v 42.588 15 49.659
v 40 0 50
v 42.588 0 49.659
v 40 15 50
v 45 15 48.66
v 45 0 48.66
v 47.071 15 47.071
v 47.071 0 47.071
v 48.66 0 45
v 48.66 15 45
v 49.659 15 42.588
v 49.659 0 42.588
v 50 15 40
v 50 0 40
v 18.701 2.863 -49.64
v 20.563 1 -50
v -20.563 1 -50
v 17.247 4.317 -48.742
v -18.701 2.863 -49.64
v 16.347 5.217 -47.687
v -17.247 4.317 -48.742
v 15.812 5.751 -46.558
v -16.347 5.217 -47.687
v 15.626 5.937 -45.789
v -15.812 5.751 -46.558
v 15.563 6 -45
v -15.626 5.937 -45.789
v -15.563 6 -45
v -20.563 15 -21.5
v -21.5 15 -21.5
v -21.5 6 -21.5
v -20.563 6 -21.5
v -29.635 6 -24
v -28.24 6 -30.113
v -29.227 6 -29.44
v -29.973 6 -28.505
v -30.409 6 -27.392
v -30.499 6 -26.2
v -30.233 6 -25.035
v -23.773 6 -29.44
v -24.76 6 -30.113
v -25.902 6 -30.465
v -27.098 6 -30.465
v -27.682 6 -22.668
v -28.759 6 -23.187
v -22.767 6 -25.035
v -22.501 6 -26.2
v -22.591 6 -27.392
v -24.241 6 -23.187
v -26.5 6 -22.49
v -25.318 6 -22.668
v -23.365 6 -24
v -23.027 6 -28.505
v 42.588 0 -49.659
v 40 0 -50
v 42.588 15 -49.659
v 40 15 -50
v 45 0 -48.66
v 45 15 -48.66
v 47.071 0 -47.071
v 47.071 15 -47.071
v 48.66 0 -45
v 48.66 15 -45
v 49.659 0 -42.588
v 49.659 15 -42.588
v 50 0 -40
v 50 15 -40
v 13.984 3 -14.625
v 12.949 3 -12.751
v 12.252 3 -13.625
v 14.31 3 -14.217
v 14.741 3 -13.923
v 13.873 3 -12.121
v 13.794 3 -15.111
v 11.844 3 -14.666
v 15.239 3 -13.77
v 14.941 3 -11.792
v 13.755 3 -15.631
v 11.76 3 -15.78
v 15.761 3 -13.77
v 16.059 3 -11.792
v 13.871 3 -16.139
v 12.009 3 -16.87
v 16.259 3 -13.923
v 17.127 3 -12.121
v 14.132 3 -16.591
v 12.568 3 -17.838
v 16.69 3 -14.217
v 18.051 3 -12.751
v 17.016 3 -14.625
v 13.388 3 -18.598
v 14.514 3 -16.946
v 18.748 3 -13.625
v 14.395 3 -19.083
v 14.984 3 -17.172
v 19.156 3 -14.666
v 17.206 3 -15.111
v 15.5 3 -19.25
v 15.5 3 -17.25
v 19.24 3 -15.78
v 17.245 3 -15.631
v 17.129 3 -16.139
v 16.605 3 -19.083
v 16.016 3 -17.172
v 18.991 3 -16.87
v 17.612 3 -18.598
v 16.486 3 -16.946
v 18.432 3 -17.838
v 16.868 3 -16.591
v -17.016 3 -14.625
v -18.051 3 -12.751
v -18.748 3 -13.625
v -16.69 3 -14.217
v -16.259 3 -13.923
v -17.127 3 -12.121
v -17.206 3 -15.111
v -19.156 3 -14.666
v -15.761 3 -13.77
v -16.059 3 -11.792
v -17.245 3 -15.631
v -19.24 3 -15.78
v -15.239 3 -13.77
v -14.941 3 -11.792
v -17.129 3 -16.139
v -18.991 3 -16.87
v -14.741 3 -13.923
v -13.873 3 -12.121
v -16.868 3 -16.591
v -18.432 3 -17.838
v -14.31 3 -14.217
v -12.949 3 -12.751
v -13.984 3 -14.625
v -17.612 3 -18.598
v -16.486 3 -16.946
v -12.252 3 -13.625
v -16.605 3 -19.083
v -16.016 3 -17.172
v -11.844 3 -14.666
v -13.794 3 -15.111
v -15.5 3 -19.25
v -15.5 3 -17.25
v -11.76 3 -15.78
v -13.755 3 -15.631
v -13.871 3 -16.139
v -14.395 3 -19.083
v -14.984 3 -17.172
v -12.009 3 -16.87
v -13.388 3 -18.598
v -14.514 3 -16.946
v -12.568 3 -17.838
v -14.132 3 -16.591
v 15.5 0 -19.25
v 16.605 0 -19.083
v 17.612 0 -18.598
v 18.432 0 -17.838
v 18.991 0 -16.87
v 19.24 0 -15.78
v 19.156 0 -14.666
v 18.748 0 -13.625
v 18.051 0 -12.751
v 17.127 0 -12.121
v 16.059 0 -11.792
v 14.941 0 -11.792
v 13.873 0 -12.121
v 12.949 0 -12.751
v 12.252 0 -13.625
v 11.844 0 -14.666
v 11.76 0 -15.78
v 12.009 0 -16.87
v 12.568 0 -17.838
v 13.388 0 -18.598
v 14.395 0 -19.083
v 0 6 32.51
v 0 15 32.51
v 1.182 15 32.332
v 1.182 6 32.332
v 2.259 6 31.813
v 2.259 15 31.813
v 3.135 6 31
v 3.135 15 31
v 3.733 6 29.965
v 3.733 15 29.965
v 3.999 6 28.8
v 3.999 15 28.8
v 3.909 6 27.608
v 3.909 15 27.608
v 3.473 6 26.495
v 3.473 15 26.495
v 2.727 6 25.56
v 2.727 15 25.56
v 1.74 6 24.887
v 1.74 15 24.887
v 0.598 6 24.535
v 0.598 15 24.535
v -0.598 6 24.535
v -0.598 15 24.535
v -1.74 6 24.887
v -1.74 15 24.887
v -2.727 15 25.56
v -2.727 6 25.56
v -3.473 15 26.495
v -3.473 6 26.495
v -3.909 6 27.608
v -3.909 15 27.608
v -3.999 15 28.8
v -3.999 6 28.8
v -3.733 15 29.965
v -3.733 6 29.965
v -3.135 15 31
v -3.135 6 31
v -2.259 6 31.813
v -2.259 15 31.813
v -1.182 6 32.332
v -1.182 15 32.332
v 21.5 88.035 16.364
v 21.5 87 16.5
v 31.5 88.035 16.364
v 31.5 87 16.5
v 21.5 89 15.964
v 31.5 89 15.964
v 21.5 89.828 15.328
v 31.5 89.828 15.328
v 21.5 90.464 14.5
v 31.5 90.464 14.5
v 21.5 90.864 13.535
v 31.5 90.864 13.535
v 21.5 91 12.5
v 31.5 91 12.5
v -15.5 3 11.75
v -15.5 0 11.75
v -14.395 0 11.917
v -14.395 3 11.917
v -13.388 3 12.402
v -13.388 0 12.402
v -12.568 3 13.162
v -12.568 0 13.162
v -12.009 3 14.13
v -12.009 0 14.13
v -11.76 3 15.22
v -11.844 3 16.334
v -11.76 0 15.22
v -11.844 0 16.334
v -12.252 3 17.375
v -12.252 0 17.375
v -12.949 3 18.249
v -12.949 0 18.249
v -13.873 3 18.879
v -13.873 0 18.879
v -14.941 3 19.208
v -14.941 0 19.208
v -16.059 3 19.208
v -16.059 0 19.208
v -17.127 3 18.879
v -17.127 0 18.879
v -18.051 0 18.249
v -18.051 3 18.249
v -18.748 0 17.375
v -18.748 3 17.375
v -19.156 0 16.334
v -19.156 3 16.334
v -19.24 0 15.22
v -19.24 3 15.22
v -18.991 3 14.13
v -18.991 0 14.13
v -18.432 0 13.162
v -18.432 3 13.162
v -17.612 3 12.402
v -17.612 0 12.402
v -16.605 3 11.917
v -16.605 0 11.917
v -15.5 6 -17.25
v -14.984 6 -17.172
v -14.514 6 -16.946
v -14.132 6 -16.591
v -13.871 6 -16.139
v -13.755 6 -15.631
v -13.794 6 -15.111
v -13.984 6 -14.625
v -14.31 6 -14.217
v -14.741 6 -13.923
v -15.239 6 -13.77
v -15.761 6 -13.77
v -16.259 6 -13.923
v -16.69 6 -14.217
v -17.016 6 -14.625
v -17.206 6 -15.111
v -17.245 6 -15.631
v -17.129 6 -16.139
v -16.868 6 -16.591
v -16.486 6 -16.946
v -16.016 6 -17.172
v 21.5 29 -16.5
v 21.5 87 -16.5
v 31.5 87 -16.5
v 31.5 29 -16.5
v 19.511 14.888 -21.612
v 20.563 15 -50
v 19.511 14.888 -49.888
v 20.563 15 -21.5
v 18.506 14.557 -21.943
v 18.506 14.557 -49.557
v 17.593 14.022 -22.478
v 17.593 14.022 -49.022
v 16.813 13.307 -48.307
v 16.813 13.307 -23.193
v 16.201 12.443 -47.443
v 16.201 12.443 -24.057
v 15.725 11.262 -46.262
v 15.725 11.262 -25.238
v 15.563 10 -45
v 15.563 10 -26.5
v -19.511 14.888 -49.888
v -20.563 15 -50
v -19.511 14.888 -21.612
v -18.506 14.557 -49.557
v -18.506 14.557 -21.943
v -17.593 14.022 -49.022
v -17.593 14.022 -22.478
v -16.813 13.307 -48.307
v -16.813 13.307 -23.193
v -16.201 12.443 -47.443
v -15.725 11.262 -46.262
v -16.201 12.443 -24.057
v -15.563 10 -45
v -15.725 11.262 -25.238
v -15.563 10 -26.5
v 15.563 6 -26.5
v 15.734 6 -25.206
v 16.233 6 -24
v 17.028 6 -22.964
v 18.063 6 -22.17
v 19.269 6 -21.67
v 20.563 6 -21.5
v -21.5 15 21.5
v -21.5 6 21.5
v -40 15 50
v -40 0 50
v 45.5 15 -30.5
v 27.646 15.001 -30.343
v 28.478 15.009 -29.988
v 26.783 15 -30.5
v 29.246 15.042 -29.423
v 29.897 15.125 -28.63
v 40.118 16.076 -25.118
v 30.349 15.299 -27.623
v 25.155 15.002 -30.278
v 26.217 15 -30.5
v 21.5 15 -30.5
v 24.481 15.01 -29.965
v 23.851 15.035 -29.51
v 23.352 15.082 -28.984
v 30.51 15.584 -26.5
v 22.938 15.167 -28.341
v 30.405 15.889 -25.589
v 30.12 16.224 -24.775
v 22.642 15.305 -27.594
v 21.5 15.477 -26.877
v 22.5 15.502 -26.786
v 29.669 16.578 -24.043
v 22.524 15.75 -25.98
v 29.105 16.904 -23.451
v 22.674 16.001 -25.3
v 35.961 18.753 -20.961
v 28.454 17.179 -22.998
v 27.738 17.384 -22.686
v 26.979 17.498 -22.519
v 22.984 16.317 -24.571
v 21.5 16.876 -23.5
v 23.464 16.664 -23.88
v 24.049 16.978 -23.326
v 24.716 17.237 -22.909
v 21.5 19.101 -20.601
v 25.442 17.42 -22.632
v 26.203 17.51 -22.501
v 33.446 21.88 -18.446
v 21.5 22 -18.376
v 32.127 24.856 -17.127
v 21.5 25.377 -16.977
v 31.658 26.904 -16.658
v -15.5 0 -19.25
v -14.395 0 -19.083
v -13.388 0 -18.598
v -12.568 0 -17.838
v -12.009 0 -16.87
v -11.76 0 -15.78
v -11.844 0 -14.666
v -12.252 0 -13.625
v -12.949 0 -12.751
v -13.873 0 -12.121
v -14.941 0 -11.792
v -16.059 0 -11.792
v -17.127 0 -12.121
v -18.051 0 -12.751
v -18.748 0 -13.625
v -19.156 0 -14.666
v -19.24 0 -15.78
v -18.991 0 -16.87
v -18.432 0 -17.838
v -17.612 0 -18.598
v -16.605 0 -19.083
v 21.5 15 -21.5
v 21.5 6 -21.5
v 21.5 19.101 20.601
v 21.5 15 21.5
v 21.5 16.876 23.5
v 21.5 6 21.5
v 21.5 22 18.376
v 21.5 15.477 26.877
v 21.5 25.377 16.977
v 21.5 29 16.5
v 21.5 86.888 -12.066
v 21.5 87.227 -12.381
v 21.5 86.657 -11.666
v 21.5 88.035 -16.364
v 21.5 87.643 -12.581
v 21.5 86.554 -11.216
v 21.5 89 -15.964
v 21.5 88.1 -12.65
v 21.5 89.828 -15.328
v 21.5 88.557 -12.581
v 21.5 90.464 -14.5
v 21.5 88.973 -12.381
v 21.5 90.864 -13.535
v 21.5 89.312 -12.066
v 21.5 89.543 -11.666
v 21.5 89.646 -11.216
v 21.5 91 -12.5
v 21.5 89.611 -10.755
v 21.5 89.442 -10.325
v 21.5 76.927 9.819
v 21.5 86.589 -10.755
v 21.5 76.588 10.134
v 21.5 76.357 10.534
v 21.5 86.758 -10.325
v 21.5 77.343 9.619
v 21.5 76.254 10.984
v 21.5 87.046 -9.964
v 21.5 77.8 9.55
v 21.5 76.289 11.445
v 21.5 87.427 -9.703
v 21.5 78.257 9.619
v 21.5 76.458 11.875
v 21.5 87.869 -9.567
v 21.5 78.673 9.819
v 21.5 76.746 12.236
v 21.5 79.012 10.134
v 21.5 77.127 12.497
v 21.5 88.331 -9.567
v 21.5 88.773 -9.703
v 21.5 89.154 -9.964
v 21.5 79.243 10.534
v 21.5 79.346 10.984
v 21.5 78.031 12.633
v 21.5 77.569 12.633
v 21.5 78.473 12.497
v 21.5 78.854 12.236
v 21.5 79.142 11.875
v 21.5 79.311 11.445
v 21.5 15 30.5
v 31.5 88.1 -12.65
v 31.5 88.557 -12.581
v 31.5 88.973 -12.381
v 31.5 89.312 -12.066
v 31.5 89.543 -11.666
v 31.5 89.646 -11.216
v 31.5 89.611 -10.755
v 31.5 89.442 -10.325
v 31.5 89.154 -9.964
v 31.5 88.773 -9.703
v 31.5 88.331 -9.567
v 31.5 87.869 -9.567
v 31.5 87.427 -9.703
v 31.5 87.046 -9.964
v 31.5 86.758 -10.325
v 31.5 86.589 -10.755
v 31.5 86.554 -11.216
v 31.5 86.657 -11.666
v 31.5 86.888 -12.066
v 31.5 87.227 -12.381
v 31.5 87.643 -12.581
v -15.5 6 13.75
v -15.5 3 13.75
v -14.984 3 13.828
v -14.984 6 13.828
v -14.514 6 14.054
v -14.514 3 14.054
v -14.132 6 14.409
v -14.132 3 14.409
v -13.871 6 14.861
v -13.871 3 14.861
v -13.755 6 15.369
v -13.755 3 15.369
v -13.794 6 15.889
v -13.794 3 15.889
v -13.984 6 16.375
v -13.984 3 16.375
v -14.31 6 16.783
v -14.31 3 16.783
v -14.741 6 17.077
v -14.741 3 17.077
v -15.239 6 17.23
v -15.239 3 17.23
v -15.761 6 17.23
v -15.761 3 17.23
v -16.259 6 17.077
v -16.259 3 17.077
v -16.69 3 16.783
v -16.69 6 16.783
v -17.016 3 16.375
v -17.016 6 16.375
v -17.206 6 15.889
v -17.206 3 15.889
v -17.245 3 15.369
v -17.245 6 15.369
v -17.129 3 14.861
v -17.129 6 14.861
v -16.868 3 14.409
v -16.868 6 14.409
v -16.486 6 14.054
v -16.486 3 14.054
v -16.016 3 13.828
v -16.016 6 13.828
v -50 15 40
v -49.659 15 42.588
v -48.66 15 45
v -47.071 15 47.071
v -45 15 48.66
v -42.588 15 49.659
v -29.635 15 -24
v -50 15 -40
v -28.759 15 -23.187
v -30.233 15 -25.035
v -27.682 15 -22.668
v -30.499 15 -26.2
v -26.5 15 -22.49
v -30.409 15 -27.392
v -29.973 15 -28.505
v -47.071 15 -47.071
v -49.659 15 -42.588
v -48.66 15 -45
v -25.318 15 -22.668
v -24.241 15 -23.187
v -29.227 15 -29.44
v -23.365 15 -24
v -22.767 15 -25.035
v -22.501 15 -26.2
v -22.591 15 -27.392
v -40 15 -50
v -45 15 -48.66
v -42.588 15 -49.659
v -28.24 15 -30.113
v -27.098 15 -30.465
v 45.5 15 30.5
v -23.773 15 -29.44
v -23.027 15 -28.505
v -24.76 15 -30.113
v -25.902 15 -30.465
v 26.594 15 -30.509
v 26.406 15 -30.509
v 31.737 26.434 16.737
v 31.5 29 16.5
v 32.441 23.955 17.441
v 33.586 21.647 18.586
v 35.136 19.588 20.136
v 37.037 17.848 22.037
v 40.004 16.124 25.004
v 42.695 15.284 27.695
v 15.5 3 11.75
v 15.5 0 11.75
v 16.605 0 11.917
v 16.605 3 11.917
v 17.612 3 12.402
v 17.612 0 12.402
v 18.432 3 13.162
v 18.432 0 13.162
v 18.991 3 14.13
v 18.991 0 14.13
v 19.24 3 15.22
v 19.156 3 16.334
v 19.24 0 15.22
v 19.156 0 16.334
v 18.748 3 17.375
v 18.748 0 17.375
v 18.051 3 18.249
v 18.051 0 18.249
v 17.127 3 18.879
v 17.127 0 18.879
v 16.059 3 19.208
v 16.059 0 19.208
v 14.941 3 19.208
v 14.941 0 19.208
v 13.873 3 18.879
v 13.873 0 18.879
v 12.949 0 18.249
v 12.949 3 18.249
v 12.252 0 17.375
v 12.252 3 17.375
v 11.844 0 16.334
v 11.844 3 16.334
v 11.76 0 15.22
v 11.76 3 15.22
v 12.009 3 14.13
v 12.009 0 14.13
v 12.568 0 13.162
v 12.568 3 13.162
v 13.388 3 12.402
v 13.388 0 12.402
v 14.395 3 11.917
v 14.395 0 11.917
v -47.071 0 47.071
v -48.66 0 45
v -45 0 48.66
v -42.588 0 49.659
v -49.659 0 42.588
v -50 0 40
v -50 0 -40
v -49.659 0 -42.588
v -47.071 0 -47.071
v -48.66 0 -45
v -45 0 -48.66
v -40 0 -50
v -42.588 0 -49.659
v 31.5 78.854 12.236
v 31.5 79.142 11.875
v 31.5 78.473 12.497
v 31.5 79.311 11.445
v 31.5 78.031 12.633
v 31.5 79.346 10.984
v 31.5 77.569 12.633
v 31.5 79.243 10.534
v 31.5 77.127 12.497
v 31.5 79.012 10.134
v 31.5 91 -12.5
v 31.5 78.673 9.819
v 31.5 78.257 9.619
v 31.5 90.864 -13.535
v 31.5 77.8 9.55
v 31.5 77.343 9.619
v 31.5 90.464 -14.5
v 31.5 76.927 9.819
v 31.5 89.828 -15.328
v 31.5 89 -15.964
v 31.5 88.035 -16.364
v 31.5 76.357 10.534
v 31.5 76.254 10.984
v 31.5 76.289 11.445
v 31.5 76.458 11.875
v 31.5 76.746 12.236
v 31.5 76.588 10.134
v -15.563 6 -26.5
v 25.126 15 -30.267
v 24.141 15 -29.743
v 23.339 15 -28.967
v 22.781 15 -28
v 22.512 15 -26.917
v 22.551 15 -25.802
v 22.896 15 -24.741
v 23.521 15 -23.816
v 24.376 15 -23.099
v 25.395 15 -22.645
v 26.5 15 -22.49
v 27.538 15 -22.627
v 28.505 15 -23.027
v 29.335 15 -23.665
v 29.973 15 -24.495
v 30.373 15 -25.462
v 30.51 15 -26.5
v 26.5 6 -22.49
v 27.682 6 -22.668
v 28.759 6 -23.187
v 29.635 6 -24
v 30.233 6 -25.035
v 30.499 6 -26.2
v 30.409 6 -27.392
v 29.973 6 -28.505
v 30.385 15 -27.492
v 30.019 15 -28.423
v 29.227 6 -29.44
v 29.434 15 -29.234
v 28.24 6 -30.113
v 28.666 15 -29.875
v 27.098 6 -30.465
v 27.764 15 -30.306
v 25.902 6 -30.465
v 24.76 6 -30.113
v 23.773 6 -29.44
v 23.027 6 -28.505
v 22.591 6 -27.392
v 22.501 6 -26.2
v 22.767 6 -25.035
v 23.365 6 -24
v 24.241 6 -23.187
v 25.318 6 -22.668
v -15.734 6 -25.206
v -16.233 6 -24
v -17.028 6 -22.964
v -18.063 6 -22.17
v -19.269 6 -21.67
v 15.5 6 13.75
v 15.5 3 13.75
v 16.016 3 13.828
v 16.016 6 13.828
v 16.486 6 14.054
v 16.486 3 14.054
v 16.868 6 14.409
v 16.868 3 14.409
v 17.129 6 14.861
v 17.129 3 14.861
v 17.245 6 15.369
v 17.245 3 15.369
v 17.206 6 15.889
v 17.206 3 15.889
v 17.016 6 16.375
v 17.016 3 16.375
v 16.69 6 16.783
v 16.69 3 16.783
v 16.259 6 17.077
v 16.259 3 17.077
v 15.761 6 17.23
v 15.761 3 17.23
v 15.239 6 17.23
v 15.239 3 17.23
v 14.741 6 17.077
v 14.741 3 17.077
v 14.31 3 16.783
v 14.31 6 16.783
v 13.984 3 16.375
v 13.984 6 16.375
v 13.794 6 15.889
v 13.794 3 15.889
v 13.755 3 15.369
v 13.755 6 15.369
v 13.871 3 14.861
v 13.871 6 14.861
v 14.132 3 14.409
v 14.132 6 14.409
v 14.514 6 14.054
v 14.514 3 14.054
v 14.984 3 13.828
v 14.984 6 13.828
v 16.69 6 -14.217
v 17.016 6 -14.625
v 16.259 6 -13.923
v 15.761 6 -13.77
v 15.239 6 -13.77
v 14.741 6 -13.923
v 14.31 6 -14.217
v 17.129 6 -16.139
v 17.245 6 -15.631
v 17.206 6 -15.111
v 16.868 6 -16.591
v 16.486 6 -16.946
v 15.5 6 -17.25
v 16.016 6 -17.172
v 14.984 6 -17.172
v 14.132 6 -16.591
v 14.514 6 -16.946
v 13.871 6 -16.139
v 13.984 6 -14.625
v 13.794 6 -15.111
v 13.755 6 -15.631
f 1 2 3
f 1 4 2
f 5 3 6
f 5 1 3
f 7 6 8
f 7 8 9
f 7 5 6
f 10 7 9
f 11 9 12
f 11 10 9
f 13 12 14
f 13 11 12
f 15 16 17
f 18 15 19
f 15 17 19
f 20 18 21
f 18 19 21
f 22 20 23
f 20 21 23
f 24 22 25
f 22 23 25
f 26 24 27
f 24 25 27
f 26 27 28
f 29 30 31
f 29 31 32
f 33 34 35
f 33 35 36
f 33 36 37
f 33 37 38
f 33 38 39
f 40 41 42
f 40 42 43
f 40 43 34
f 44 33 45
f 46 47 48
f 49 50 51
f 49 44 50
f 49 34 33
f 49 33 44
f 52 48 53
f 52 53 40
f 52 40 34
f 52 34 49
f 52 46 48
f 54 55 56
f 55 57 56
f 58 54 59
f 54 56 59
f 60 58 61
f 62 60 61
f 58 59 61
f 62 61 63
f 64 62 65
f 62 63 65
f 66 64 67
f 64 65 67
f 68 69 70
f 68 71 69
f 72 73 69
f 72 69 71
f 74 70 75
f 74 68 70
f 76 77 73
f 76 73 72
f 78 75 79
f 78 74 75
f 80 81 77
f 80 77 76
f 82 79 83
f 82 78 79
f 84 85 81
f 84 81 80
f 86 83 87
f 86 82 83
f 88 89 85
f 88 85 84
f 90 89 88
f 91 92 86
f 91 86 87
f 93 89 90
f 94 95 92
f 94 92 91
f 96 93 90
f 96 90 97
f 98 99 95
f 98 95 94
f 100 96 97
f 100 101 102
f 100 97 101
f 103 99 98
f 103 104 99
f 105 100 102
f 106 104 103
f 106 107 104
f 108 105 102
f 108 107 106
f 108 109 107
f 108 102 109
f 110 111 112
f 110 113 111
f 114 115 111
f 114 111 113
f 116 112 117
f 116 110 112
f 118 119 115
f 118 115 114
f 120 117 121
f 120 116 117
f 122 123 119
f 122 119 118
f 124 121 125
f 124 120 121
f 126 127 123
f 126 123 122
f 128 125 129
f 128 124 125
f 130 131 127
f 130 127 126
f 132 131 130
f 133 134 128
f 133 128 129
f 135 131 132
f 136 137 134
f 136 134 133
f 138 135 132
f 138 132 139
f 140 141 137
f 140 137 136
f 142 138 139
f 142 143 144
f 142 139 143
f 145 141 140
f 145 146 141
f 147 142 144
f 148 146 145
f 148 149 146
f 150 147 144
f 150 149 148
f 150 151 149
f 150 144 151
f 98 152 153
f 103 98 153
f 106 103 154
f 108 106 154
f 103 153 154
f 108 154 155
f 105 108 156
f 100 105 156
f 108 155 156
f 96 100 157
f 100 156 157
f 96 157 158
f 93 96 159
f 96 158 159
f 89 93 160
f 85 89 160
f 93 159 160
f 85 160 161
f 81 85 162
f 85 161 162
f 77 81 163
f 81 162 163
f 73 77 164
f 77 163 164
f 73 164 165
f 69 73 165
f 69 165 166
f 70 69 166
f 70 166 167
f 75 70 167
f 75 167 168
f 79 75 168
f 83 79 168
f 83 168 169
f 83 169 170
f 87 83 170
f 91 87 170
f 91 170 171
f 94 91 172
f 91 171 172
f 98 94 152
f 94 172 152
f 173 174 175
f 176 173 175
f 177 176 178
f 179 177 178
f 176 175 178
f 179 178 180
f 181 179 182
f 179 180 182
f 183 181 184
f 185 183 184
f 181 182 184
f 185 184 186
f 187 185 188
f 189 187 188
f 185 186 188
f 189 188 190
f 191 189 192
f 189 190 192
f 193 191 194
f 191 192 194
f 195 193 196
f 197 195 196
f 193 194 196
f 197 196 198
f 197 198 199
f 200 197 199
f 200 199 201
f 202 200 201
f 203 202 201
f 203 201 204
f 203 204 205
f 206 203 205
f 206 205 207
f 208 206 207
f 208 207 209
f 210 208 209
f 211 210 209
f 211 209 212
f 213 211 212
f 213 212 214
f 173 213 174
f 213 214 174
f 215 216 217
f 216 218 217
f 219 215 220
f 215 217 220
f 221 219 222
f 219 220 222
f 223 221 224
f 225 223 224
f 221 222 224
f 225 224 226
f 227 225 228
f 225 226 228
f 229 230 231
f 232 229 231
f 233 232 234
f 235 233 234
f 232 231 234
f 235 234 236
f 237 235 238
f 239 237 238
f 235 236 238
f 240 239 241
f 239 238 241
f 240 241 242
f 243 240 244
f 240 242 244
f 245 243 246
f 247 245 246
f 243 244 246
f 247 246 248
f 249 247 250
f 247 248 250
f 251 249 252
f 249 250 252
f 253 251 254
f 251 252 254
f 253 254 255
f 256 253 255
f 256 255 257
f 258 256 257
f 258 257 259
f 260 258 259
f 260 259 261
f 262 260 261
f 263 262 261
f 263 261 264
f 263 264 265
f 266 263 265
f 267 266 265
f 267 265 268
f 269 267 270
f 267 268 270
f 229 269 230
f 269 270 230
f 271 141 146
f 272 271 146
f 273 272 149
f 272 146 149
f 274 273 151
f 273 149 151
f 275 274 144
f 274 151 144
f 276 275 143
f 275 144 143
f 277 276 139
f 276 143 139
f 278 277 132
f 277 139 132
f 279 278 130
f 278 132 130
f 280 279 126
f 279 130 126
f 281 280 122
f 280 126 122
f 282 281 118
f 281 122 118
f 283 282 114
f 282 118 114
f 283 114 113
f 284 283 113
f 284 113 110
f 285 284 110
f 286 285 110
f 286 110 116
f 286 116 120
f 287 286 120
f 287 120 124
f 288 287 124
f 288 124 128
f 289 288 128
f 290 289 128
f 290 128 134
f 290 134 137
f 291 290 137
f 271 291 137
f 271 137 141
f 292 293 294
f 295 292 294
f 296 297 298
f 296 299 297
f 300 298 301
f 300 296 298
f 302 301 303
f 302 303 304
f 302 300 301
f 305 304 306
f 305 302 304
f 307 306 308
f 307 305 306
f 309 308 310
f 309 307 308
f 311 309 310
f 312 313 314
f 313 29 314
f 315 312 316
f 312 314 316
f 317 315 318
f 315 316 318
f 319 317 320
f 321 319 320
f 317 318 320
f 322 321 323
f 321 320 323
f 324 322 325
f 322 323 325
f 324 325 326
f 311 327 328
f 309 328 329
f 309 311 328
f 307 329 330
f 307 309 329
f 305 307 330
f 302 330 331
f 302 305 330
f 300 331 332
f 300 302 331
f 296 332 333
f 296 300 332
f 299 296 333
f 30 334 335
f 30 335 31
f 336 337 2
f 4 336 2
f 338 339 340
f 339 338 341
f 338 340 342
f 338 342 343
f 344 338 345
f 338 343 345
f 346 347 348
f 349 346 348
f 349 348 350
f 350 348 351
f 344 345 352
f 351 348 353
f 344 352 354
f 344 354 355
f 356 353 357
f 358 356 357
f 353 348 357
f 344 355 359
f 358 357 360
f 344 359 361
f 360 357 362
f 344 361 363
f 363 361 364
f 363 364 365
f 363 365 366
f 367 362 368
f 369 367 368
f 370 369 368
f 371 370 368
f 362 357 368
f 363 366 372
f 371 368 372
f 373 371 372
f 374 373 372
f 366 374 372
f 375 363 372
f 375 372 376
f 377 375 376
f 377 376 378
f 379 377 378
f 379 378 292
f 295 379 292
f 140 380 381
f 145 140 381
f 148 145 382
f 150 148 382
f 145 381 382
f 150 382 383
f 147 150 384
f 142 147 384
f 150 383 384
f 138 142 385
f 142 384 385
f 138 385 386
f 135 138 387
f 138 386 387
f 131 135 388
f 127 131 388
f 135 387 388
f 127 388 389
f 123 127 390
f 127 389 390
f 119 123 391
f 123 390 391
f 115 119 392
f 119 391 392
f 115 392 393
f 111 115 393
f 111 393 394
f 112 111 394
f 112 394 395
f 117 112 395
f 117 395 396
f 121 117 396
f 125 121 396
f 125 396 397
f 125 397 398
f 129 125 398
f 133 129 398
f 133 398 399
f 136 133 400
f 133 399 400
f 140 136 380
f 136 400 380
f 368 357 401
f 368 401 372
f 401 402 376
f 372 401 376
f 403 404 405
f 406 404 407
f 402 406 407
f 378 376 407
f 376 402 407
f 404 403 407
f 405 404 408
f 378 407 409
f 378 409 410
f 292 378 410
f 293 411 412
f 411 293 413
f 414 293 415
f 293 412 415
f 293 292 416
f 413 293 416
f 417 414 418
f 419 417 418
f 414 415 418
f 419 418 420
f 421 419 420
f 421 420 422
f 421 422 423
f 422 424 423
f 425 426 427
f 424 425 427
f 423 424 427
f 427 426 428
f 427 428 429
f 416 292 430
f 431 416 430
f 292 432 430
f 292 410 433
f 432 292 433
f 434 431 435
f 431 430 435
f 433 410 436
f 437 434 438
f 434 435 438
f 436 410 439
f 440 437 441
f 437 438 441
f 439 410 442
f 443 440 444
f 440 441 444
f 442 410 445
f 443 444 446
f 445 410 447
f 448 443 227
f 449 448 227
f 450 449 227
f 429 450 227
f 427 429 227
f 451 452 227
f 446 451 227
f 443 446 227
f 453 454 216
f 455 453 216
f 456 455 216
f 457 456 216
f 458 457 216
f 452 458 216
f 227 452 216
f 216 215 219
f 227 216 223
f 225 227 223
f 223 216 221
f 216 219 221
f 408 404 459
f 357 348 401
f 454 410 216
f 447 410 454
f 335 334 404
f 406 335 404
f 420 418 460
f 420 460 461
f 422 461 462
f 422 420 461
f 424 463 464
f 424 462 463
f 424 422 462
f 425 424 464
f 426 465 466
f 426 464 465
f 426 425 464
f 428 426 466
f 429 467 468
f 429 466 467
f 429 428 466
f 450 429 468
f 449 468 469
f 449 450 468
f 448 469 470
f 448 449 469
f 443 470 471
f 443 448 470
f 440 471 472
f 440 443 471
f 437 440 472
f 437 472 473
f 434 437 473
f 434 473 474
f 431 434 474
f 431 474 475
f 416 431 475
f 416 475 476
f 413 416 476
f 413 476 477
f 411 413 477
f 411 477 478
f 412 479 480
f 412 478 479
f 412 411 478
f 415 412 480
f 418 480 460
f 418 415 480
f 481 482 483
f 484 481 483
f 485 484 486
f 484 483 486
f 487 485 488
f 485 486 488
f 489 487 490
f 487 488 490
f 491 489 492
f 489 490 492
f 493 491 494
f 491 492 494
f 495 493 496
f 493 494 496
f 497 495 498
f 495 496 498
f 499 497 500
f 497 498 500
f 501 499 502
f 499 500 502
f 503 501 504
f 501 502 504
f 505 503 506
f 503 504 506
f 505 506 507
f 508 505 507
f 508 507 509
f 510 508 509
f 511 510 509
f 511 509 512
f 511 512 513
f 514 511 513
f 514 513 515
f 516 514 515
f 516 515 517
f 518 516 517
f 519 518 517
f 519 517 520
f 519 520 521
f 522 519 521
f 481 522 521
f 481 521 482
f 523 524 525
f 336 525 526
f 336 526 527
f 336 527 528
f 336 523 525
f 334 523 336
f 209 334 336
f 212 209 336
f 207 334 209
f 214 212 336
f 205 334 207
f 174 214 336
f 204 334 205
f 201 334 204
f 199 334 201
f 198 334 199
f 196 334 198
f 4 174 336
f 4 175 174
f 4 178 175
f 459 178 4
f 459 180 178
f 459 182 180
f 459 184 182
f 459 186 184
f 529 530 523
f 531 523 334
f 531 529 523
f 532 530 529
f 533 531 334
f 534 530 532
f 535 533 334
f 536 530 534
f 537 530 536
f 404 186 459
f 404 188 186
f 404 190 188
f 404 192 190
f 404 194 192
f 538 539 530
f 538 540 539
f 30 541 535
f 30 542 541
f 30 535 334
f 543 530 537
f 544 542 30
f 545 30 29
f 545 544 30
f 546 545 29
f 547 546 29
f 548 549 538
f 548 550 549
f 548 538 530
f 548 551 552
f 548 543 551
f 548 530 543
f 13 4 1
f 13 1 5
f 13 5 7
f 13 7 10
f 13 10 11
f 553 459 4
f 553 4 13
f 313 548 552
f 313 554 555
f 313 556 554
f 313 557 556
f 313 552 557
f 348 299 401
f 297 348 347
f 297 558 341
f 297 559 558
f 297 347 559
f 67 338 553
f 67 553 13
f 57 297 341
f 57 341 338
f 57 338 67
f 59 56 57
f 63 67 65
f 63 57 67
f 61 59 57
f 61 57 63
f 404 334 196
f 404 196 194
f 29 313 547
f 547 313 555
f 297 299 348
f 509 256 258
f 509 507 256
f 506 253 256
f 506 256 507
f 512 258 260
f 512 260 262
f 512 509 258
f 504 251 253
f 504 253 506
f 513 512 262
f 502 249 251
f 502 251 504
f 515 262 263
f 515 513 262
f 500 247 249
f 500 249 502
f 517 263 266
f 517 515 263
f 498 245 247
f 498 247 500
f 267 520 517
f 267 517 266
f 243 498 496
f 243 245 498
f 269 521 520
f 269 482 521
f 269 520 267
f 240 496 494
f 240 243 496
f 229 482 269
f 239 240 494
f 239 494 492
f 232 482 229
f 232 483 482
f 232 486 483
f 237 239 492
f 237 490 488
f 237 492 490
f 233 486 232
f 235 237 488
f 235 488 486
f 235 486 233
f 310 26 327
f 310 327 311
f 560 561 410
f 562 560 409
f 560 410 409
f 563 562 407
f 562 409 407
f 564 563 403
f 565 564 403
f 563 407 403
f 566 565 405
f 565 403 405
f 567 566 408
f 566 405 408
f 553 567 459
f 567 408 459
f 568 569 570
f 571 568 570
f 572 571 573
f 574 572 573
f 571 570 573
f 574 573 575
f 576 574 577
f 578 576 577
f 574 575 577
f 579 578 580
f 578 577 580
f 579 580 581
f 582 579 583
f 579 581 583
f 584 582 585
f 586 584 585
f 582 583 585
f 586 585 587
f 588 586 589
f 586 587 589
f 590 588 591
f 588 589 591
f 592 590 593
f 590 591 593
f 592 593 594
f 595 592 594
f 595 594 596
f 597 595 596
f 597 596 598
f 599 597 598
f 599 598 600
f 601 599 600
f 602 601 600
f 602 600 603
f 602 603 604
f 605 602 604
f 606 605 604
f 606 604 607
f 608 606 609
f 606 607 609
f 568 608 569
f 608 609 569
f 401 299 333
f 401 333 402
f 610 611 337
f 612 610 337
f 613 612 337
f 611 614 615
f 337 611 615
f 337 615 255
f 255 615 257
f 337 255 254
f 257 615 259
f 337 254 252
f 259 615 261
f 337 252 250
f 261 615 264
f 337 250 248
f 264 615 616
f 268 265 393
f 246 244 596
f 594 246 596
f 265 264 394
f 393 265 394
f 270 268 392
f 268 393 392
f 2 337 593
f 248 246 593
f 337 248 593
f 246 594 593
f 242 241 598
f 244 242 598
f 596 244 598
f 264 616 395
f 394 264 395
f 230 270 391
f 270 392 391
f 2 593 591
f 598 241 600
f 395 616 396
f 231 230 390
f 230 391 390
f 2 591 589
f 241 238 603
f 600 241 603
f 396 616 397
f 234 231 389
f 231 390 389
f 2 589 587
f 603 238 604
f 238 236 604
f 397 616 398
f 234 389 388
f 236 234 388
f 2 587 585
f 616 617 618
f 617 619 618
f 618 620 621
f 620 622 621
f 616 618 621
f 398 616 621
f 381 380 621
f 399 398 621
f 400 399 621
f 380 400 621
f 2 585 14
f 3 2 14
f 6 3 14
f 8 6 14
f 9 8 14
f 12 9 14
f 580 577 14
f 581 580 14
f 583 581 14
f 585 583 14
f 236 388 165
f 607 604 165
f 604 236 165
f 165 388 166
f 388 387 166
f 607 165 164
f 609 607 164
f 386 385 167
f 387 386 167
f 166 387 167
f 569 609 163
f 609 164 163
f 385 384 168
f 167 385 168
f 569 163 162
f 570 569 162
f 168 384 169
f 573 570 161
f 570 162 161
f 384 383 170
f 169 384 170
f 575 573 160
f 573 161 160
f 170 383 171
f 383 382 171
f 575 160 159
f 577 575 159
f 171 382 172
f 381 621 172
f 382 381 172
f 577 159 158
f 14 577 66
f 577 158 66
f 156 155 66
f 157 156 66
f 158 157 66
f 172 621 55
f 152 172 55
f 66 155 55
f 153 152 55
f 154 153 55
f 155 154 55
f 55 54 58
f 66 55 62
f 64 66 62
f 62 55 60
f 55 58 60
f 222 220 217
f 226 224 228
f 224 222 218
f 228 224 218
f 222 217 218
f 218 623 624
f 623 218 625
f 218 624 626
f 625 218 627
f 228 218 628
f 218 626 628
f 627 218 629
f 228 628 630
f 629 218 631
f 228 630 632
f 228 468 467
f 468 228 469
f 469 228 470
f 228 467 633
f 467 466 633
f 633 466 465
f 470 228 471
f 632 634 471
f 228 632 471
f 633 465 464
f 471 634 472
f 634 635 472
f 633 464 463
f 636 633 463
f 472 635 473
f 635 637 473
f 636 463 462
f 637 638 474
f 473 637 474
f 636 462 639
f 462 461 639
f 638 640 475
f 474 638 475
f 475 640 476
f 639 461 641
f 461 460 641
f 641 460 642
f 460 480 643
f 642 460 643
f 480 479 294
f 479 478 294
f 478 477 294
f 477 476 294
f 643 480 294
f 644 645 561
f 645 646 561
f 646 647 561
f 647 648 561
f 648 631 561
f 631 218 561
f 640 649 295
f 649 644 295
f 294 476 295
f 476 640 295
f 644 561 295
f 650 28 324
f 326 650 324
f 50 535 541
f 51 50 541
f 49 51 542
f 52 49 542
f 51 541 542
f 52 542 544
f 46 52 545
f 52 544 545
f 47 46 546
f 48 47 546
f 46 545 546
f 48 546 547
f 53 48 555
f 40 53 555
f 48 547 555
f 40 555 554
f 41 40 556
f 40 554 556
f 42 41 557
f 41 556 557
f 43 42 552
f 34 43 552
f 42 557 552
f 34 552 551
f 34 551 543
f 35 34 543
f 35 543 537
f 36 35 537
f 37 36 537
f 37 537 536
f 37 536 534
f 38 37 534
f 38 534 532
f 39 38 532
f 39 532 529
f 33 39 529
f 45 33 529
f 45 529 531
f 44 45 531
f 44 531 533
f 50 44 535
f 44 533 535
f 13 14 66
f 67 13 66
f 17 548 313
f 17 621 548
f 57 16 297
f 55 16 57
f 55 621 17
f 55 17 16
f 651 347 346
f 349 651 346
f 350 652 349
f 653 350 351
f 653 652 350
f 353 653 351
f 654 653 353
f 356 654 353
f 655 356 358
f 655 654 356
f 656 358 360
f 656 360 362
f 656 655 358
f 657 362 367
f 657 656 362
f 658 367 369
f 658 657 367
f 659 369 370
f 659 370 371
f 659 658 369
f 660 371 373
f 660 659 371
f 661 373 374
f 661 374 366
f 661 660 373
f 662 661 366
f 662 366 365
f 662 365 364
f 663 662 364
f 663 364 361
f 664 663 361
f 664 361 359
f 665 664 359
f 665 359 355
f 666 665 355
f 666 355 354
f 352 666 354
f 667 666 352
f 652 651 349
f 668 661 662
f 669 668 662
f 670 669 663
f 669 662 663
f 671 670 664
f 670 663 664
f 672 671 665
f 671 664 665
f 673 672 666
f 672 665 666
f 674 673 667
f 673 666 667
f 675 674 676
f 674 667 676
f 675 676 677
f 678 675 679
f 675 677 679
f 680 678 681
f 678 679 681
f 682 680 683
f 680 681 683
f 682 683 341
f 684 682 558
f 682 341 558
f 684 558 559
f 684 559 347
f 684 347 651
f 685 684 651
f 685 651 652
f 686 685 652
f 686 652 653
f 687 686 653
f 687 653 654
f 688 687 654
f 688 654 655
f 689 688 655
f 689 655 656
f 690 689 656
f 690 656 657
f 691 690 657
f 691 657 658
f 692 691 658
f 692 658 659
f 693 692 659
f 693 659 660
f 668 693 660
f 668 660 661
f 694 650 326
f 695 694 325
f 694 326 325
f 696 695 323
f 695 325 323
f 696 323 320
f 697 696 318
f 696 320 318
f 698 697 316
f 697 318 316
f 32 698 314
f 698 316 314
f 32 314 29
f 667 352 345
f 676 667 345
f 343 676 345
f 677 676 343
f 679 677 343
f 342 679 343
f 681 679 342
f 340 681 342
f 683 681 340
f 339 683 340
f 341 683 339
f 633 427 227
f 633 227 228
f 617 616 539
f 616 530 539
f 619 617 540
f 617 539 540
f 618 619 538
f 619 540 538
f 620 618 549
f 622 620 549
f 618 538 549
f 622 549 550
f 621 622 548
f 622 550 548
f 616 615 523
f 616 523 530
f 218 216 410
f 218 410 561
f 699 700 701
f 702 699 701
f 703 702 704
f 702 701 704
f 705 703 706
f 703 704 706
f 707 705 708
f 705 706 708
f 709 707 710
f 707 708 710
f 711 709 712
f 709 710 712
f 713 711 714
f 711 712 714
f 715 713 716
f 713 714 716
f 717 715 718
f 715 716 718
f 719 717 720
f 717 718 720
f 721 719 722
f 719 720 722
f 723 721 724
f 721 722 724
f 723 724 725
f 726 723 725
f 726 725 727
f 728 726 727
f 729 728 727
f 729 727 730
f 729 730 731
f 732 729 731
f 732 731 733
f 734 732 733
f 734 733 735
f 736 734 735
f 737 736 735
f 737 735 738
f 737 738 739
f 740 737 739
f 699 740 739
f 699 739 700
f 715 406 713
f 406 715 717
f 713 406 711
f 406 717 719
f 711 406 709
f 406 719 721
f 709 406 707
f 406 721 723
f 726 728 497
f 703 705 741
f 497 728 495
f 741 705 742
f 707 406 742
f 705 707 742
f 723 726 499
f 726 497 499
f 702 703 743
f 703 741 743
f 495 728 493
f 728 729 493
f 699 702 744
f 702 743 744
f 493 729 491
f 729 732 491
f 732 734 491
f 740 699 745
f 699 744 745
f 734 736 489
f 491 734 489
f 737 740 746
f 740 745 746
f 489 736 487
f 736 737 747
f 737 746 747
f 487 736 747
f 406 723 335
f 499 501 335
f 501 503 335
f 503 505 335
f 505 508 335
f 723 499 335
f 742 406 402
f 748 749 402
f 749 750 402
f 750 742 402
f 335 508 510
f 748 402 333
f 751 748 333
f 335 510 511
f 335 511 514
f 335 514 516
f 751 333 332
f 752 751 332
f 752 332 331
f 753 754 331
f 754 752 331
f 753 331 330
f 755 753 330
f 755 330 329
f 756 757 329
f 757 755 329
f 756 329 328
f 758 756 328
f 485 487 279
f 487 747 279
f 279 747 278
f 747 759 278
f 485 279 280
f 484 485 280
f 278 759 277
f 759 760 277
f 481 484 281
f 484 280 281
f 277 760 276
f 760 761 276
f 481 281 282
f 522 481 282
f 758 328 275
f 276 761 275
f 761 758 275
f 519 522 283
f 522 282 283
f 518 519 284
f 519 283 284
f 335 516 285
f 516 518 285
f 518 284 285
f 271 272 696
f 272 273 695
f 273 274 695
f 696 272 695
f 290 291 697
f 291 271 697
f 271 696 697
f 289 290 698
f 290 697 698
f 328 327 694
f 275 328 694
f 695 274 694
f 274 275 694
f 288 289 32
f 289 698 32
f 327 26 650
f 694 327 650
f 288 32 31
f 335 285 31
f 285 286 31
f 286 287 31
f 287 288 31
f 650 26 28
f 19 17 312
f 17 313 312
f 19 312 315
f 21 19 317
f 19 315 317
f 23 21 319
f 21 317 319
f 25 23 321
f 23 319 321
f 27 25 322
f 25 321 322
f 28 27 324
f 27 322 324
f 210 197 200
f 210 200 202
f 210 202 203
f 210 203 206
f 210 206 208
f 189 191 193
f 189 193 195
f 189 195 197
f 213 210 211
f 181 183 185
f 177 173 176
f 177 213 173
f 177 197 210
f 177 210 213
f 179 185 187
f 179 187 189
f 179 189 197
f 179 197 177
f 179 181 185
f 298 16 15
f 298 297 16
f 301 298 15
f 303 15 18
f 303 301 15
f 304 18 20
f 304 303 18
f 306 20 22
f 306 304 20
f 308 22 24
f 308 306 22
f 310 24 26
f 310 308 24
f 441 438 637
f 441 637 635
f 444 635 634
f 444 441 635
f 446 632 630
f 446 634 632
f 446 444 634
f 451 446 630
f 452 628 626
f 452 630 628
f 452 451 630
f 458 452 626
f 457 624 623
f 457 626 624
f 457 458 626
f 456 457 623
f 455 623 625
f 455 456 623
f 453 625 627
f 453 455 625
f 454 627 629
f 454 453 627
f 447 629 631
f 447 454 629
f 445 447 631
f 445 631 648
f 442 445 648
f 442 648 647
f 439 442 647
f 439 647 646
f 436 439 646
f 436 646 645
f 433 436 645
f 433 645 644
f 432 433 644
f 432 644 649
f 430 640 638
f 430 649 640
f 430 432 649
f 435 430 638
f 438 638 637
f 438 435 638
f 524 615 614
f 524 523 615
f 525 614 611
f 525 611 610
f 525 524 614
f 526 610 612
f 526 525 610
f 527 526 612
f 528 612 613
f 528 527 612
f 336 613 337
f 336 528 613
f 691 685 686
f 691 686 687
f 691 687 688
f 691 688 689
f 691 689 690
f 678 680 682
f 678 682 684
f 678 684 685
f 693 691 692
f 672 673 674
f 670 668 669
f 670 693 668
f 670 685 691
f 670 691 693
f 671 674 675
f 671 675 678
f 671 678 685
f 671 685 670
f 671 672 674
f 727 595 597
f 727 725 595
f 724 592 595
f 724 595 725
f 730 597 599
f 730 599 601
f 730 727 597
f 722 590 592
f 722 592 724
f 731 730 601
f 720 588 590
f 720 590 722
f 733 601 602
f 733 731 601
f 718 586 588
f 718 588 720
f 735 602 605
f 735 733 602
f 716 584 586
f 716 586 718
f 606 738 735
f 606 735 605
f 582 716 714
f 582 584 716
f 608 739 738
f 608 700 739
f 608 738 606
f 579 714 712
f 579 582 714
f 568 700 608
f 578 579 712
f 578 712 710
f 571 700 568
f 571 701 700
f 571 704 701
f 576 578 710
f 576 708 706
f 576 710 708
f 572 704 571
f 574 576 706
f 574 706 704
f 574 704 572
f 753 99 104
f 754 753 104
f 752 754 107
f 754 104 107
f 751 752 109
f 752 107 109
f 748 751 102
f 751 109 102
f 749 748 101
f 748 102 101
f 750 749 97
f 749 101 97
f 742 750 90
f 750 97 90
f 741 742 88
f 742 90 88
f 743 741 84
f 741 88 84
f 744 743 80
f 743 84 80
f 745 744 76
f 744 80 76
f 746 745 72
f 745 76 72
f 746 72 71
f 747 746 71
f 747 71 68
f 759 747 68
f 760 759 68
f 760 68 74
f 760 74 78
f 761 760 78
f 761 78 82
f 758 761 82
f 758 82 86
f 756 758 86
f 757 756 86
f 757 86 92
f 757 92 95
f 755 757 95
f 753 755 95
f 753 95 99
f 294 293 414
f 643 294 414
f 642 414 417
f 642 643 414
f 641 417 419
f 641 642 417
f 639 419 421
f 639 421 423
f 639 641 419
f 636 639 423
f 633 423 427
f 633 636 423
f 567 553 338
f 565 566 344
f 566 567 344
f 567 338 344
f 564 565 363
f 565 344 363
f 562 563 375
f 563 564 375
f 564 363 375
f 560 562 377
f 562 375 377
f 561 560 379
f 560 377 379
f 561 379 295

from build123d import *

# Parameters (mm, degrees)
SKETCH1_W               = 100
SKETCH1_H               = 100
BOSS_EXTRUDE1_DEPTH     = 15
SKETCH2_R               = 4.01
SKETCH2_W               = 43
SKETCH2_H               = 43
CUT_EXTRUDE1_DEPTH      = 9
SKETCH3_W               = 31.126627524
SKETCH3_H               = 9
CUT_EXTRUDE2_DEPTH      = 28.5
SKETCH4_R               = 1.75
CUT_EXTRUDE3_DEPTH      = 6
SKETCH5_R               = 3.75
CUT_EXTRUDE4_DEPTH      = 3
FILLET1_R               = 10
FILLET2_R               = 5
SKETCH6_W               = 10
SKETCH6_H               = 33
BOSS_EXTRUDE2_DEPTH     = 76
CUT_EXTRUDE5_DEPTH      = 132.99715906
CUT_EXTRUDE5_DEPTH_BACK = 132.99715906
SKETCH7_R               = 1.55
FILLET3_R               = 4
FILLET4_START           = 21.5
FILLET4_DEPTH           = 24
FILLET4_START_2         = -16.5
FILLET4_2_DEPTH         = 33
FILLET4_START_3         = -30.5
FILLET4_3_DEPTH         = 80.5
FILLET4_START_4         = 15
FILLET4_4_OUTLINE_R     = 4.01
FILLET4_4_DEPTH         = 14


with BuildPart() as part:
    # Sketch1 → Boss-Extrude1 (new body)
    with BuildSketch(Plane(origin=(0, 0, 0), x_dir=(1, 0, 0), z_dir=(0, 1, 0))):
        Rectangle(SKETCH1_W, SKETCH1_H)
    extrude(amount=BOSS_EXTRUDE1_DEPTH)

    # Sketch2 → Cut-Extrude1 (cut)
    with BuildSketch(Plane(origin=(0, 15, 0), x_dir=(1, 0, 0), z_dir=(0, 1, 0))):
        with Locations(Location((-26.5, 26.5, 0), (0, 0, 270))):
            Circle(SKETCH2_R)
        with Locations(Location((0, -28.5, 0), (0, 0, 270))):
            Circle(SKETCH2_R)
        with Locations(Location((26.5, 26.5, 0), (0, 0, 270))):
            Circle(SKETCH2_R)
        Rectangle(SKETCH2_W, SKETCH2_H)
    extrude(amount=-CUT_EXTRUDE1_DEPTH, mode=Mode.SUBTRACT)

    # Sketch3 → Cut-Extrude2 (cut)
    with BuildSketch(Plane(origin=(0, 0, -50), x_dir=(-1, 0, 0), z_dir=(0, 0, -1))):
        with Locations((0, 10.5)):
            Rectangle(SKETCH3_W, SKETCH3_H)
    extrude(amount=-CUT_EXTRUDE2_DEPTH, mode=Mode.SUBTRACT)

    # Sketch4 → Cut-Extrude3 (cut)
    with BuildSketch(Plane.XZ):
        with Locations(Location((-15.5, 15.5, 0), (0, 0, 270))):
            Circle(SKETCH4_R)
        with Locations(Location((15.5, 15.5, 0), (0, 0, 270))):
            Circle(SKETCH4_R)
        with Locations(Location((15.5, -15.5, 0), (0, 0, 270))):
            Circle(SKETCH4_R)
        with Locations(Location((-15.5, -15.5, 0), (0, 0, 270))):
            Circle(SKETCH4_R)
    extrude(amount=-CUT_EXTRUDE3_DEPTH, mode=Mode.SUBTRACT)

    # Sketch5 → Cut-Extrude4 (cut)
    with BuildSketch(Plane.XZ):
        with Locations(Location((-15.5, 15.5, 0), (0, 0, 270))):
            Circle(SKETCH5_R)
        with Locations(Location((15.5, 15.5, 0), (0, 0, 270))):
            Circle(SKETCH5_R)
        with Locations(Location((-15.5, -15.5, 0), (0, 0, 270))):
            Circle(SKETCH5_R)
        with Locations(Location((15.5, -15.5, 0), (0, 0, 270))):
            Circle(SKETCH5_R)
    extrude(amount=-CUT_EXTRUDE4_DEPTH, mode=Mode.SUBTRACT)

    # Fillet1
    fillet1_edges = [part.edges().sort_by_distance(p)[0] for p in [
        (50, 7.5, 50),
        (-50, 7.5, 50),
        (-50, 7.5, -50),
        (50, 7.5, -50),
    ]]
    fillet(fillet1_edges, radius=FILLET1_R)

    # Fillet2
    fillet2_edges = [part.edges().sort_by_distance(p)[0] for p in [
        (15.563313762, 15, -35.75),
        (-15.563313762, 15, -35.75),
        (15.563313762, 10.5, -50),
        (0, 6, -50),
        (-15.563313762, 10.5, -50),
        (15.563313762, 10.5, -21.5),
        (-15.563313762, 10.5, -21.5),
    ]]
    fillet(fillet2_edges, radius=FILLET2_R)

    # Sketch6 → Boss-Extrude2 (add)
    with BuildSketch(Plane(origin=(0, 15, 0), x_dir=(1, 0, 0), z_dir=(0, 1, 0))):
        with Locations((26.5, 0)):
            Rectangle(SKETCH6_W, SKETCH6_H)
    extrude(amount=BOSS_EXTRUDE2_DEPTH)

    # Sketch7 → Cut-Extrude5 (cut, two sides: drawn at the far end of the back side and taken through both)
    with BuildSketch(Plane(origin=(31.5, 0, 0), x_dir=(0, 0, -1), z_dir=(1, 0, 0)).offset(-CUT_EXTRUDE5_DEPTH_BACK)):
        with Locations((11.1, 88.1)):
            Circle(SKETCH7_R)
        with Locations((-11.1, 77.8)):
            Circle(SKETCH7_R)
    extrude(amount=CUT_EXTRUDE5_DEPTH + CUT_EXTRUDE5_DEPTH_BACK, mode=Mode.SUBTRACT)

    # Fillet3
    fillet3_edges = [part.edges().sort_by_distance(p)[0] for p in [
        (26.5, 91, 16.5),
        (26.5, 91, -16.5),
    ]]
    fillet(fillet3_edges, radius=FILLET3_R)

    # Fillet4: read off the stored shape, not the designer's step
    # Fillet4 outline → Fillet4 (add)
    with BuildSketch(Plane.YZ.offset(FILLET4_START)):
        with BuildLine():
            Line((15, 16.5), (29, 16.5))
            ThreePointArc((29, 16.5), (19.100505063, 20.600505063), (15, 30.5))
            Line((15, 30.5), (15, 16.5))
        make_face()
        with BuildLine():
            Line((29, -16.5), (15, -16.5))
            Line((15, -16.5), (15, -30.5))
            ThreePointArc((15, -30.5), (19.100505063, -20.600505063), (29, -16.5))
        make_face()
    extrude(amount=FILLET4_DEPTH)

    # Fillet4 2 outline → Fillet4 2 (add)
    with BuildSketch(Plane.XY.offset(FILLET4_START_2)):
        with BuildLine():
            ThreePointArc((45.5, 15), (35.600505063, 19.100505063), (31.5, 29))
            Line((31.5, 29), (31.5, 15))
            Line((31.5, 15), (45.5, 15))
        make_face()
    extrude(amount=FILLET4_2_DEPTH)

    # Fillet4 3 outline → Fillet4 3 (cut)
    with BuildSketch(Plane.XY.offset(FILLET4_START_3)):
        with BuildLine():
            Line((31.5, 30), (31.5, 29))
            ThreePointArc((31.5, 29), (35.600505063, 19.100505063), (45.5, 15))
            Line((45.5, 15), (47, 15))
            Line((47, 15), (47, 30))
            Line((47, 30), (31.5, 30))
        make_face()
    extrude(amount=FILLET4_3_DEPTH, mode=Mode.SUBTRACT)

    # Fillet4 4 outline → Fillet4 4 (cut)
    with BuildSketch(Plane(origin=(0, 0, 0), x_dir=(1, 0, 0), z_dir=(0, 1, 0)).offset(FILLET4_START_4)):
        with Locations((26.5, 26.5)):
            Circle(FILLET4_4_OUTLINE_R)
    extrude(amount=FILLET4_4_DEPTH, mode=Mode.SUBTRACT)


solid = part.part
